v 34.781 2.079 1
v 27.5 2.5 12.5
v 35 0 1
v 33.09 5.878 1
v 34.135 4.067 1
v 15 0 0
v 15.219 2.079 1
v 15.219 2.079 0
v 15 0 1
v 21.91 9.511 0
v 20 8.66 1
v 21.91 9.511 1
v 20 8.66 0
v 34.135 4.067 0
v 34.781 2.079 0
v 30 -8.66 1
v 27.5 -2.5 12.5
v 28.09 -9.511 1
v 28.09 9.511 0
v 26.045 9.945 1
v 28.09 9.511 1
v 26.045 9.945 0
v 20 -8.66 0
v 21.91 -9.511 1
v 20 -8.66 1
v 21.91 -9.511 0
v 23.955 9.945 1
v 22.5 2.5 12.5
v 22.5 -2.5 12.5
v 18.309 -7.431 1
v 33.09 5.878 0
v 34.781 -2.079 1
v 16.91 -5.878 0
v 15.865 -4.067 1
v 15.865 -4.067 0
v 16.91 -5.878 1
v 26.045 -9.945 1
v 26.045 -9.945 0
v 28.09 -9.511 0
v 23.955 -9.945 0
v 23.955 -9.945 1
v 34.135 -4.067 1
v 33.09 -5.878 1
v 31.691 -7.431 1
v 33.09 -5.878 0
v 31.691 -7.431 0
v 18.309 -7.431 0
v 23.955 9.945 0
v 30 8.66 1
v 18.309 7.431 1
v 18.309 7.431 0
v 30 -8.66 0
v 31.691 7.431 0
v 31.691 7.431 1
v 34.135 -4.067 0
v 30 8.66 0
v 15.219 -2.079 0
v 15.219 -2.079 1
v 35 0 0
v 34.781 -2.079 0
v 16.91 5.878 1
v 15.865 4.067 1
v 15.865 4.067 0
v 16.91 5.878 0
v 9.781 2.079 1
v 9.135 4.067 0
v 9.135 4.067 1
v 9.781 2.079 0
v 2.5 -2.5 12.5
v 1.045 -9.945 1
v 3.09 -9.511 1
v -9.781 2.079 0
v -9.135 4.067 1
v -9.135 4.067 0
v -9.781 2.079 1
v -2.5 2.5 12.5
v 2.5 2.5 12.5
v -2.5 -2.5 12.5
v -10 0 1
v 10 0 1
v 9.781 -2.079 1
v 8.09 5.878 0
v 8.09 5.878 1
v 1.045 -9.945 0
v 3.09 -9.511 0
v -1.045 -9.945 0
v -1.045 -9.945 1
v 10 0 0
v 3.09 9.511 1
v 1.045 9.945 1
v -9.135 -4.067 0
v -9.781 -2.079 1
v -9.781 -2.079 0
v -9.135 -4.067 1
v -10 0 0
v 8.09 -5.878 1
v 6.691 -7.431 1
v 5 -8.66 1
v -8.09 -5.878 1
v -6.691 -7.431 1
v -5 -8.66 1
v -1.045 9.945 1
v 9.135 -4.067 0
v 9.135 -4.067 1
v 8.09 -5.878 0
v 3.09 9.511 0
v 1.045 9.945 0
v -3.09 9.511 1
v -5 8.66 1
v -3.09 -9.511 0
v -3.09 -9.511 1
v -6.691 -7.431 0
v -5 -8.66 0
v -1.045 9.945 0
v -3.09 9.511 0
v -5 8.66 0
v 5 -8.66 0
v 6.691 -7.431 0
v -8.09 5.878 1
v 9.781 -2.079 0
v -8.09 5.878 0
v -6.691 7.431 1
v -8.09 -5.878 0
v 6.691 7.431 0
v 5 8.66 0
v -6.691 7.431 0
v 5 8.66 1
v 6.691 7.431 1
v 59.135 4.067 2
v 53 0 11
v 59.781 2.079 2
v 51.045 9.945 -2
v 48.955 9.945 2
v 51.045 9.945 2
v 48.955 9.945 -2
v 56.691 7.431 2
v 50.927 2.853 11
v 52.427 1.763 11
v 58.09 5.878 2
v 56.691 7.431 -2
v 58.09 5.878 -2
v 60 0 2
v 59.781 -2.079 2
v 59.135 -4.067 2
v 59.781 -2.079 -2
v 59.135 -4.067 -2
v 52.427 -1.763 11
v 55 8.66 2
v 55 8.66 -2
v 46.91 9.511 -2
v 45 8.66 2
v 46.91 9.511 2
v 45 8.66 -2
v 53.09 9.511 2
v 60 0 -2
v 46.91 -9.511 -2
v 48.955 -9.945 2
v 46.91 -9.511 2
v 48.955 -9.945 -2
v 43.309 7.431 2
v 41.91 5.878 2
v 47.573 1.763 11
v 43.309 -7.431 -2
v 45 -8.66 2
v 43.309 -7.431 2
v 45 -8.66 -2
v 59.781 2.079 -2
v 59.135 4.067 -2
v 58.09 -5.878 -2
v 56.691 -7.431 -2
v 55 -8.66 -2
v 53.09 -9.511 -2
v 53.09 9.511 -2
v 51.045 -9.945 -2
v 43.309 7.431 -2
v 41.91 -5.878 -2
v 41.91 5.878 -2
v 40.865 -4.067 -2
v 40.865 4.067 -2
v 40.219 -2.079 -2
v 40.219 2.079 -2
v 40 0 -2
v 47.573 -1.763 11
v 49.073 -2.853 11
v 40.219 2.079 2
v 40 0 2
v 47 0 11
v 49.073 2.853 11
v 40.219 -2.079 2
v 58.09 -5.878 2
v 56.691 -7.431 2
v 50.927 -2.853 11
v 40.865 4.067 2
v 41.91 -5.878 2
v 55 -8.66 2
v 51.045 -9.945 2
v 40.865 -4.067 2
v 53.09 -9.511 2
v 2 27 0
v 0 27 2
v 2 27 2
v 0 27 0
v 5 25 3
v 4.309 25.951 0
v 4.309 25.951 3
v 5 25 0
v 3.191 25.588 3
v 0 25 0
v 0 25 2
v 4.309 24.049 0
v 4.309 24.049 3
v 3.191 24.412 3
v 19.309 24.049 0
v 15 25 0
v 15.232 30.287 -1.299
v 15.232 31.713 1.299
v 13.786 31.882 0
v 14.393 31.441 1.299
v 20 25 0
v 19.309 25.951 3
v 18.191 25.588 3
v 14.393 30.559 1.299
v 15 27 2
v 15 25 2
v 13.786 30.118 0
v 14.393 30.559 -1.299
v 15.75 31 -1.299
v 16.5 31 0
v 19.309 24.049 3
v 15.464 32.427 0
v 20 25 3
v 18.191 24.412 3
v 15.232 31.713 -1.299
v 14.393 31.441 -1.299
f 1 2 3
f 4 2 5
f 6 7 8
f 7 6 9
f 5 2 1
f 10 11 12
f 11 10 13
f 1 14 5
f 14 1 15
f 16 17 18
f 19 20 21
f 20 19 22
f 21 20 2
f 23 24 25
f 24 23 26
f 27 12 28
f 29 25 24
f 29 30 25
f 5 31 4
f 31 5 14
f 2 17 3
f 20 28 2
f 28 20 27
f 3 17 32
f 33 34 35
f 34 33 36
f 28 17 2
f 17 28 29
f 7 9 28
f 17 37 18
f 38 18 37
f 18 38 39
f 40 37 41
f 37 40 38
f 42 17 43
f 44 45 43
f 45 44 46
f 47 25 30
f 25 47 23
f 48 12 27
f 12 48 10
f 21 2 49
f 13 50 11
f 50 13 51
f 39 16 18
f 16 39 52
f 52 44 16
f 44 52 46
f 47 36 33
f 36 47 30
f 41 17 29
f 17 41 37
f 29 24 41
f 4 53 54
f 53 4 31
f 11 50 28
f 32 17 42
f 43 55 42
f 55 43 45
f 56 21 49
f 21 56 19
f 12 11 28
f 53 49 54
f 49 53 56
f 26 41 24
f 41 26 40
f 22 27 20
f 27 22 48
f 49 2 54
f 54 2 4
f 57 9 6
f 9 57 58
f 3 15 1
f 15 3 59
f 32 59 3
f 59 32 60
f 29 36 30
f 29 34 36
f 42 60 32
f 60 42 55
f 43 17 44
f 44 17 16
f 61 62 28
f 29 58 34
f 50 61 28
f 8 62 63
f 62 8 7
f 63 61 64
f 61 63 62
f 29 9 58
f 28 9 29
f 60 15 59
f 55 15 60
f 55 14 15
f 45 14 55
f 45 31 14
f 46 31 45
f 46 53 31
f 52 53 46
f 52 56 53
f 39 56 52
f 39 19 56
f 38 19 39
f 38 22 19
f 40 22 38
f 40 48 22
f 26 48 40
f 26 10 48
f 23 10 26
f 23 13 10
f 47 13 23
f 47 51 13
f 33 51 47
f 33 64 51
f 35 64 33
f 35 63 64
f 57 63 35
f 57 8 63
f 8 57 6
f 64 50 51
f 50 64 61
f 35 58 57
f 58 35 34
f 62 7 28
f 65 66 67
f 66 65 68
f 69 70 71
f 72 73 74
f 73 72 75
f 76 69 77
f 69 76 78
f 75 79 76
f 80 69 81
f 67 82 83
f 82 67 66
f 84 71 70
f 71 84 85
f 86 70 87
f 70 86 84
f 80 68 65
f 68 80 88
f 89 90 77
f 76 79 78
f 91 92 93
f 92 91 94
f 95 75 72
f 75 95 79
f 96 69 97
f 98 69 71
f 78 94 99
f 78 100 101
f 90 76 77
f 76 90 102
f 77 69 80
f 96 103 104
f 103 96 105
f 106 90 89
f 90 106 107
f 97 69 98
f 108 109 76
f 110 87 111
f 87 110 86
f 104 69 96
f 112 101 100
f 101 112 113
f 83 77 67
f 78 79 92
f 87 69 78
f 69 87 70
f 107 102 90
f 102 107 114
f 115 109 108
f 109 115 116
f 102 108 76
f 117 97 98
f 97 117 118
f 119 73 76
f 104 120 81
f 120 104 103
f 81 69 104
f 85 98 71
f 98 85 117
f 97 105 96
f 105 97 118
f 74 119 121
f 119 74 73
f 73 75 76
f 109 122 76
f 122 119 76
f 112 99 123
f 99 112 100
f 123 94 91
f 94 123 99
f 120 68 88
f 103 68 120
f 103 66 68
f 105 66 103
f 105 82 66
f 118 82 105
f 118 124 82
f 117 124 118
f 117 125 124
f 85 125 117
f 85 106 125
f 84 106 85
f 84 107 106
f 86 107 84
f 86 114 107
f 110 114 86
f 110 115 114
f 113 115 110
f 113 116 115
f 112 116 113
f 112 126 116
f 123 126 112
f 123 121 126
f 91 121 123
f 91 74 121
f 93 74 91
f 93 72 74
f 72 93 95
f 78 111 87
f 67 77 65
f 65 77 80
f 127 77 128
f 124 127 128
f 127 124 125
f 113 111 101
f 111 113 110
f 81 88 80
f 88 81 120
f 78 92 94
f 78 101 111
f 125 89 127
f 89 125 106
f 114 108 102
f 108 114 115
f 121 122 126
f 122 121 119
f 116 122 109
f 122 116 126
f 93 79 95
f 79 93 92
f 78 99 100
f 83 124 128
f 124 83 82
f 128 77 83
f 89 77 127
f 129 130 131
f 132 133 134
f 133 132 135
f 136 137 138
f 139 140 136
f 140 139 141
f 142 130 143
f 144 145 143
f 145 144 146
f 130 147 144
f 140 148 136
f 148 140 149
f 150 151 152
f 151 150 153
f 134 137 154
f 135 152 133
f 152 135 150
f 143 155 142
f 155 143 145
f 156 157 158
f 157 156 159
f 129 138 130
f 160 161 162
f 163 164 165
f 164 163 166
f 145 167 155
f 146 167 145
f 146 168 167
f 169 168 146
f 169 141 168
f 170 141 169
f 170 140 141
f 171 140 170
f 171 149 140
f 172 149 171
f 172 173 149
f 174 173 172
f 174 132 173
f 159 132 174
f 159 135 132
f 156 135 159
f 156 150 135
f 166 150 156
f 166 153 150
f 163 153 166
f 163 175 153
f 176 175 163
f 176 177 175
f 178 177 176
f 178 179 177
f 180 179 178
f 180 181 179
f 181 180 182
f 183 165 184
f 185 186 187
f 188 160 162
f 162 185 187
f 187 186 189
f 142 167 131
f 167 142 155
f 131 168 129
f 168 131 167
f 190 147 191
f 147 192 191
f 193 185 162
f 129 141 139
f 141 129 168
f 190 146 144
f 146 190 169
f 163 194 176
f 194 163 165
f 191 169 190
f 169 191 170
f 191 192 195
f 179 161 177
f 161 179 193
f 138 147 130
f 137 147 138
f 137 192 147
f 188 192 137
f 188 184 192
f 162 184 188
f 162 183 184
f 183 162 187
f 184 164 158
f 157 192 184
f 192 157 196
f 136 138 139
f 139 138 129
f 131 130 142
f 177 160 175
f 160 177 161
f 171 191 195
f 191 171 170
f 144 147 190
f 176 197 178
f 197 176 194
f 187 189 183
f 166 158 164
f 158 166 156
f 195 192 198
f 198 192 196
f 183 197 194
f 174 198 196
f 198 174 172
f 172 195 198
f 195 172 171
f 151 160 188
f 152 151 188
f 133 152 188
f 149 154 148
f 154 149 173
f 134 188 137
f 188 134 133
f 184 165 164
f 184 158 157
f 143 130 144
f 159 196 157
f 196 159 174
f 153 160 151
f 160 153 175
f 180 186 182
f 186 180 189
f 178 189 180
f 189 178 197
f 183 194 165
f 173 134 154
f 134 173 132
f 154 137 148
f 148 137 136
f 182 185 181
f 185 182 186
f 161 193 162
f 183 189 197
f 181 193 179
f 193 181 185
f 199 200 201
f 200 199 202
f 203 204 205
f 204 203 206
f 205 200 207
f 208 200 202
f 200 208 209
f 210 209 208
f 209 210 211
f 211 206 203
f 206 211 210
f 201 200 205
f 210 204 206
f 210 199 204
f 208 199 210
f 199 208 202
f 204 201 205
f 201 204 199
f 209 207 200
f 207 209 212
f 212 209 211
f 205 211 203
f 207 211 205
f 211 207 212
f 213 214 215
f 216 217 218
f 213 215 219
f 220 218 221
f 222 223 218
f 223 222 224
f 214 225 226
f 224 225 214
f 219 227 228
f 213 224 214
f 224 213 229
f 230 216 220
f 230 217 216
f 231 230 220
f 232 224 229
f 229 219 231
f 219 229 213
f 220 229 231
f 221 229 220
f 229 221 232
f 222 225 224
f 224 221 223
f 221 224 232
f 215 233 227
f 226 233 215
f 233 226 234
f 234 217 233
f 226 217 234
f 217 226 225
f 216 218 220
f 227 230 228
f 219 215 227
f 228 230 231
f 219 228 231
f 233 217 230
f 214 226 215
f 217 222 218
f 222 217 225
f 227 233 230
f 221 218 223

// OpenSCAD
// Empty
hull();
// No children
hull() { }

// Hull of hull (forces internal cache to be initialized; this has caused a crash earlier)
translate([25,0,0]) hull() hull3test();

module hull3test() {
  hull() {
    cylinder(r=10, h=1);
    translate([0,0,10]) cube([5,5,5], center=true);
  }
}
hull3test();

translate([50,0,0]) hull() {
  translate([0,0,10]) cylinder(r=3);
  difference() {
    cylinder(r=10, h=4, center=true);
    cylinder(r=5, h=5, center=true);
  }
}

// Don't Crash (issue 188)

translate([-5,-5,-5]) {
  hull() {
    intersection() {
      cube([1,1,1]);
      translate([-1,-1,-1]) cube([1,1,1]);
    }
  }
}

module hull3null() {
  hull() {
    cube(0);
    sphere(0);
  }
}
hull3null();

// Point cloud cache test - reuse same geometry in multiple hull operations
module cache_test_geometry() {
  cube([2,2,2]);
  translate([4,0,0]) cylinder(r=1, h=3);
}

// First hull operation - will populate point cloud cache
translate([0,25,0]) hull() {
  cache_test_geometry();
}

// Second hull operation - should reuse cached point clouds
translate([15,25,0]) hull() {
  cache_test_geometry();
  translate([0,6,0]) sphere(r=1.5);
}
